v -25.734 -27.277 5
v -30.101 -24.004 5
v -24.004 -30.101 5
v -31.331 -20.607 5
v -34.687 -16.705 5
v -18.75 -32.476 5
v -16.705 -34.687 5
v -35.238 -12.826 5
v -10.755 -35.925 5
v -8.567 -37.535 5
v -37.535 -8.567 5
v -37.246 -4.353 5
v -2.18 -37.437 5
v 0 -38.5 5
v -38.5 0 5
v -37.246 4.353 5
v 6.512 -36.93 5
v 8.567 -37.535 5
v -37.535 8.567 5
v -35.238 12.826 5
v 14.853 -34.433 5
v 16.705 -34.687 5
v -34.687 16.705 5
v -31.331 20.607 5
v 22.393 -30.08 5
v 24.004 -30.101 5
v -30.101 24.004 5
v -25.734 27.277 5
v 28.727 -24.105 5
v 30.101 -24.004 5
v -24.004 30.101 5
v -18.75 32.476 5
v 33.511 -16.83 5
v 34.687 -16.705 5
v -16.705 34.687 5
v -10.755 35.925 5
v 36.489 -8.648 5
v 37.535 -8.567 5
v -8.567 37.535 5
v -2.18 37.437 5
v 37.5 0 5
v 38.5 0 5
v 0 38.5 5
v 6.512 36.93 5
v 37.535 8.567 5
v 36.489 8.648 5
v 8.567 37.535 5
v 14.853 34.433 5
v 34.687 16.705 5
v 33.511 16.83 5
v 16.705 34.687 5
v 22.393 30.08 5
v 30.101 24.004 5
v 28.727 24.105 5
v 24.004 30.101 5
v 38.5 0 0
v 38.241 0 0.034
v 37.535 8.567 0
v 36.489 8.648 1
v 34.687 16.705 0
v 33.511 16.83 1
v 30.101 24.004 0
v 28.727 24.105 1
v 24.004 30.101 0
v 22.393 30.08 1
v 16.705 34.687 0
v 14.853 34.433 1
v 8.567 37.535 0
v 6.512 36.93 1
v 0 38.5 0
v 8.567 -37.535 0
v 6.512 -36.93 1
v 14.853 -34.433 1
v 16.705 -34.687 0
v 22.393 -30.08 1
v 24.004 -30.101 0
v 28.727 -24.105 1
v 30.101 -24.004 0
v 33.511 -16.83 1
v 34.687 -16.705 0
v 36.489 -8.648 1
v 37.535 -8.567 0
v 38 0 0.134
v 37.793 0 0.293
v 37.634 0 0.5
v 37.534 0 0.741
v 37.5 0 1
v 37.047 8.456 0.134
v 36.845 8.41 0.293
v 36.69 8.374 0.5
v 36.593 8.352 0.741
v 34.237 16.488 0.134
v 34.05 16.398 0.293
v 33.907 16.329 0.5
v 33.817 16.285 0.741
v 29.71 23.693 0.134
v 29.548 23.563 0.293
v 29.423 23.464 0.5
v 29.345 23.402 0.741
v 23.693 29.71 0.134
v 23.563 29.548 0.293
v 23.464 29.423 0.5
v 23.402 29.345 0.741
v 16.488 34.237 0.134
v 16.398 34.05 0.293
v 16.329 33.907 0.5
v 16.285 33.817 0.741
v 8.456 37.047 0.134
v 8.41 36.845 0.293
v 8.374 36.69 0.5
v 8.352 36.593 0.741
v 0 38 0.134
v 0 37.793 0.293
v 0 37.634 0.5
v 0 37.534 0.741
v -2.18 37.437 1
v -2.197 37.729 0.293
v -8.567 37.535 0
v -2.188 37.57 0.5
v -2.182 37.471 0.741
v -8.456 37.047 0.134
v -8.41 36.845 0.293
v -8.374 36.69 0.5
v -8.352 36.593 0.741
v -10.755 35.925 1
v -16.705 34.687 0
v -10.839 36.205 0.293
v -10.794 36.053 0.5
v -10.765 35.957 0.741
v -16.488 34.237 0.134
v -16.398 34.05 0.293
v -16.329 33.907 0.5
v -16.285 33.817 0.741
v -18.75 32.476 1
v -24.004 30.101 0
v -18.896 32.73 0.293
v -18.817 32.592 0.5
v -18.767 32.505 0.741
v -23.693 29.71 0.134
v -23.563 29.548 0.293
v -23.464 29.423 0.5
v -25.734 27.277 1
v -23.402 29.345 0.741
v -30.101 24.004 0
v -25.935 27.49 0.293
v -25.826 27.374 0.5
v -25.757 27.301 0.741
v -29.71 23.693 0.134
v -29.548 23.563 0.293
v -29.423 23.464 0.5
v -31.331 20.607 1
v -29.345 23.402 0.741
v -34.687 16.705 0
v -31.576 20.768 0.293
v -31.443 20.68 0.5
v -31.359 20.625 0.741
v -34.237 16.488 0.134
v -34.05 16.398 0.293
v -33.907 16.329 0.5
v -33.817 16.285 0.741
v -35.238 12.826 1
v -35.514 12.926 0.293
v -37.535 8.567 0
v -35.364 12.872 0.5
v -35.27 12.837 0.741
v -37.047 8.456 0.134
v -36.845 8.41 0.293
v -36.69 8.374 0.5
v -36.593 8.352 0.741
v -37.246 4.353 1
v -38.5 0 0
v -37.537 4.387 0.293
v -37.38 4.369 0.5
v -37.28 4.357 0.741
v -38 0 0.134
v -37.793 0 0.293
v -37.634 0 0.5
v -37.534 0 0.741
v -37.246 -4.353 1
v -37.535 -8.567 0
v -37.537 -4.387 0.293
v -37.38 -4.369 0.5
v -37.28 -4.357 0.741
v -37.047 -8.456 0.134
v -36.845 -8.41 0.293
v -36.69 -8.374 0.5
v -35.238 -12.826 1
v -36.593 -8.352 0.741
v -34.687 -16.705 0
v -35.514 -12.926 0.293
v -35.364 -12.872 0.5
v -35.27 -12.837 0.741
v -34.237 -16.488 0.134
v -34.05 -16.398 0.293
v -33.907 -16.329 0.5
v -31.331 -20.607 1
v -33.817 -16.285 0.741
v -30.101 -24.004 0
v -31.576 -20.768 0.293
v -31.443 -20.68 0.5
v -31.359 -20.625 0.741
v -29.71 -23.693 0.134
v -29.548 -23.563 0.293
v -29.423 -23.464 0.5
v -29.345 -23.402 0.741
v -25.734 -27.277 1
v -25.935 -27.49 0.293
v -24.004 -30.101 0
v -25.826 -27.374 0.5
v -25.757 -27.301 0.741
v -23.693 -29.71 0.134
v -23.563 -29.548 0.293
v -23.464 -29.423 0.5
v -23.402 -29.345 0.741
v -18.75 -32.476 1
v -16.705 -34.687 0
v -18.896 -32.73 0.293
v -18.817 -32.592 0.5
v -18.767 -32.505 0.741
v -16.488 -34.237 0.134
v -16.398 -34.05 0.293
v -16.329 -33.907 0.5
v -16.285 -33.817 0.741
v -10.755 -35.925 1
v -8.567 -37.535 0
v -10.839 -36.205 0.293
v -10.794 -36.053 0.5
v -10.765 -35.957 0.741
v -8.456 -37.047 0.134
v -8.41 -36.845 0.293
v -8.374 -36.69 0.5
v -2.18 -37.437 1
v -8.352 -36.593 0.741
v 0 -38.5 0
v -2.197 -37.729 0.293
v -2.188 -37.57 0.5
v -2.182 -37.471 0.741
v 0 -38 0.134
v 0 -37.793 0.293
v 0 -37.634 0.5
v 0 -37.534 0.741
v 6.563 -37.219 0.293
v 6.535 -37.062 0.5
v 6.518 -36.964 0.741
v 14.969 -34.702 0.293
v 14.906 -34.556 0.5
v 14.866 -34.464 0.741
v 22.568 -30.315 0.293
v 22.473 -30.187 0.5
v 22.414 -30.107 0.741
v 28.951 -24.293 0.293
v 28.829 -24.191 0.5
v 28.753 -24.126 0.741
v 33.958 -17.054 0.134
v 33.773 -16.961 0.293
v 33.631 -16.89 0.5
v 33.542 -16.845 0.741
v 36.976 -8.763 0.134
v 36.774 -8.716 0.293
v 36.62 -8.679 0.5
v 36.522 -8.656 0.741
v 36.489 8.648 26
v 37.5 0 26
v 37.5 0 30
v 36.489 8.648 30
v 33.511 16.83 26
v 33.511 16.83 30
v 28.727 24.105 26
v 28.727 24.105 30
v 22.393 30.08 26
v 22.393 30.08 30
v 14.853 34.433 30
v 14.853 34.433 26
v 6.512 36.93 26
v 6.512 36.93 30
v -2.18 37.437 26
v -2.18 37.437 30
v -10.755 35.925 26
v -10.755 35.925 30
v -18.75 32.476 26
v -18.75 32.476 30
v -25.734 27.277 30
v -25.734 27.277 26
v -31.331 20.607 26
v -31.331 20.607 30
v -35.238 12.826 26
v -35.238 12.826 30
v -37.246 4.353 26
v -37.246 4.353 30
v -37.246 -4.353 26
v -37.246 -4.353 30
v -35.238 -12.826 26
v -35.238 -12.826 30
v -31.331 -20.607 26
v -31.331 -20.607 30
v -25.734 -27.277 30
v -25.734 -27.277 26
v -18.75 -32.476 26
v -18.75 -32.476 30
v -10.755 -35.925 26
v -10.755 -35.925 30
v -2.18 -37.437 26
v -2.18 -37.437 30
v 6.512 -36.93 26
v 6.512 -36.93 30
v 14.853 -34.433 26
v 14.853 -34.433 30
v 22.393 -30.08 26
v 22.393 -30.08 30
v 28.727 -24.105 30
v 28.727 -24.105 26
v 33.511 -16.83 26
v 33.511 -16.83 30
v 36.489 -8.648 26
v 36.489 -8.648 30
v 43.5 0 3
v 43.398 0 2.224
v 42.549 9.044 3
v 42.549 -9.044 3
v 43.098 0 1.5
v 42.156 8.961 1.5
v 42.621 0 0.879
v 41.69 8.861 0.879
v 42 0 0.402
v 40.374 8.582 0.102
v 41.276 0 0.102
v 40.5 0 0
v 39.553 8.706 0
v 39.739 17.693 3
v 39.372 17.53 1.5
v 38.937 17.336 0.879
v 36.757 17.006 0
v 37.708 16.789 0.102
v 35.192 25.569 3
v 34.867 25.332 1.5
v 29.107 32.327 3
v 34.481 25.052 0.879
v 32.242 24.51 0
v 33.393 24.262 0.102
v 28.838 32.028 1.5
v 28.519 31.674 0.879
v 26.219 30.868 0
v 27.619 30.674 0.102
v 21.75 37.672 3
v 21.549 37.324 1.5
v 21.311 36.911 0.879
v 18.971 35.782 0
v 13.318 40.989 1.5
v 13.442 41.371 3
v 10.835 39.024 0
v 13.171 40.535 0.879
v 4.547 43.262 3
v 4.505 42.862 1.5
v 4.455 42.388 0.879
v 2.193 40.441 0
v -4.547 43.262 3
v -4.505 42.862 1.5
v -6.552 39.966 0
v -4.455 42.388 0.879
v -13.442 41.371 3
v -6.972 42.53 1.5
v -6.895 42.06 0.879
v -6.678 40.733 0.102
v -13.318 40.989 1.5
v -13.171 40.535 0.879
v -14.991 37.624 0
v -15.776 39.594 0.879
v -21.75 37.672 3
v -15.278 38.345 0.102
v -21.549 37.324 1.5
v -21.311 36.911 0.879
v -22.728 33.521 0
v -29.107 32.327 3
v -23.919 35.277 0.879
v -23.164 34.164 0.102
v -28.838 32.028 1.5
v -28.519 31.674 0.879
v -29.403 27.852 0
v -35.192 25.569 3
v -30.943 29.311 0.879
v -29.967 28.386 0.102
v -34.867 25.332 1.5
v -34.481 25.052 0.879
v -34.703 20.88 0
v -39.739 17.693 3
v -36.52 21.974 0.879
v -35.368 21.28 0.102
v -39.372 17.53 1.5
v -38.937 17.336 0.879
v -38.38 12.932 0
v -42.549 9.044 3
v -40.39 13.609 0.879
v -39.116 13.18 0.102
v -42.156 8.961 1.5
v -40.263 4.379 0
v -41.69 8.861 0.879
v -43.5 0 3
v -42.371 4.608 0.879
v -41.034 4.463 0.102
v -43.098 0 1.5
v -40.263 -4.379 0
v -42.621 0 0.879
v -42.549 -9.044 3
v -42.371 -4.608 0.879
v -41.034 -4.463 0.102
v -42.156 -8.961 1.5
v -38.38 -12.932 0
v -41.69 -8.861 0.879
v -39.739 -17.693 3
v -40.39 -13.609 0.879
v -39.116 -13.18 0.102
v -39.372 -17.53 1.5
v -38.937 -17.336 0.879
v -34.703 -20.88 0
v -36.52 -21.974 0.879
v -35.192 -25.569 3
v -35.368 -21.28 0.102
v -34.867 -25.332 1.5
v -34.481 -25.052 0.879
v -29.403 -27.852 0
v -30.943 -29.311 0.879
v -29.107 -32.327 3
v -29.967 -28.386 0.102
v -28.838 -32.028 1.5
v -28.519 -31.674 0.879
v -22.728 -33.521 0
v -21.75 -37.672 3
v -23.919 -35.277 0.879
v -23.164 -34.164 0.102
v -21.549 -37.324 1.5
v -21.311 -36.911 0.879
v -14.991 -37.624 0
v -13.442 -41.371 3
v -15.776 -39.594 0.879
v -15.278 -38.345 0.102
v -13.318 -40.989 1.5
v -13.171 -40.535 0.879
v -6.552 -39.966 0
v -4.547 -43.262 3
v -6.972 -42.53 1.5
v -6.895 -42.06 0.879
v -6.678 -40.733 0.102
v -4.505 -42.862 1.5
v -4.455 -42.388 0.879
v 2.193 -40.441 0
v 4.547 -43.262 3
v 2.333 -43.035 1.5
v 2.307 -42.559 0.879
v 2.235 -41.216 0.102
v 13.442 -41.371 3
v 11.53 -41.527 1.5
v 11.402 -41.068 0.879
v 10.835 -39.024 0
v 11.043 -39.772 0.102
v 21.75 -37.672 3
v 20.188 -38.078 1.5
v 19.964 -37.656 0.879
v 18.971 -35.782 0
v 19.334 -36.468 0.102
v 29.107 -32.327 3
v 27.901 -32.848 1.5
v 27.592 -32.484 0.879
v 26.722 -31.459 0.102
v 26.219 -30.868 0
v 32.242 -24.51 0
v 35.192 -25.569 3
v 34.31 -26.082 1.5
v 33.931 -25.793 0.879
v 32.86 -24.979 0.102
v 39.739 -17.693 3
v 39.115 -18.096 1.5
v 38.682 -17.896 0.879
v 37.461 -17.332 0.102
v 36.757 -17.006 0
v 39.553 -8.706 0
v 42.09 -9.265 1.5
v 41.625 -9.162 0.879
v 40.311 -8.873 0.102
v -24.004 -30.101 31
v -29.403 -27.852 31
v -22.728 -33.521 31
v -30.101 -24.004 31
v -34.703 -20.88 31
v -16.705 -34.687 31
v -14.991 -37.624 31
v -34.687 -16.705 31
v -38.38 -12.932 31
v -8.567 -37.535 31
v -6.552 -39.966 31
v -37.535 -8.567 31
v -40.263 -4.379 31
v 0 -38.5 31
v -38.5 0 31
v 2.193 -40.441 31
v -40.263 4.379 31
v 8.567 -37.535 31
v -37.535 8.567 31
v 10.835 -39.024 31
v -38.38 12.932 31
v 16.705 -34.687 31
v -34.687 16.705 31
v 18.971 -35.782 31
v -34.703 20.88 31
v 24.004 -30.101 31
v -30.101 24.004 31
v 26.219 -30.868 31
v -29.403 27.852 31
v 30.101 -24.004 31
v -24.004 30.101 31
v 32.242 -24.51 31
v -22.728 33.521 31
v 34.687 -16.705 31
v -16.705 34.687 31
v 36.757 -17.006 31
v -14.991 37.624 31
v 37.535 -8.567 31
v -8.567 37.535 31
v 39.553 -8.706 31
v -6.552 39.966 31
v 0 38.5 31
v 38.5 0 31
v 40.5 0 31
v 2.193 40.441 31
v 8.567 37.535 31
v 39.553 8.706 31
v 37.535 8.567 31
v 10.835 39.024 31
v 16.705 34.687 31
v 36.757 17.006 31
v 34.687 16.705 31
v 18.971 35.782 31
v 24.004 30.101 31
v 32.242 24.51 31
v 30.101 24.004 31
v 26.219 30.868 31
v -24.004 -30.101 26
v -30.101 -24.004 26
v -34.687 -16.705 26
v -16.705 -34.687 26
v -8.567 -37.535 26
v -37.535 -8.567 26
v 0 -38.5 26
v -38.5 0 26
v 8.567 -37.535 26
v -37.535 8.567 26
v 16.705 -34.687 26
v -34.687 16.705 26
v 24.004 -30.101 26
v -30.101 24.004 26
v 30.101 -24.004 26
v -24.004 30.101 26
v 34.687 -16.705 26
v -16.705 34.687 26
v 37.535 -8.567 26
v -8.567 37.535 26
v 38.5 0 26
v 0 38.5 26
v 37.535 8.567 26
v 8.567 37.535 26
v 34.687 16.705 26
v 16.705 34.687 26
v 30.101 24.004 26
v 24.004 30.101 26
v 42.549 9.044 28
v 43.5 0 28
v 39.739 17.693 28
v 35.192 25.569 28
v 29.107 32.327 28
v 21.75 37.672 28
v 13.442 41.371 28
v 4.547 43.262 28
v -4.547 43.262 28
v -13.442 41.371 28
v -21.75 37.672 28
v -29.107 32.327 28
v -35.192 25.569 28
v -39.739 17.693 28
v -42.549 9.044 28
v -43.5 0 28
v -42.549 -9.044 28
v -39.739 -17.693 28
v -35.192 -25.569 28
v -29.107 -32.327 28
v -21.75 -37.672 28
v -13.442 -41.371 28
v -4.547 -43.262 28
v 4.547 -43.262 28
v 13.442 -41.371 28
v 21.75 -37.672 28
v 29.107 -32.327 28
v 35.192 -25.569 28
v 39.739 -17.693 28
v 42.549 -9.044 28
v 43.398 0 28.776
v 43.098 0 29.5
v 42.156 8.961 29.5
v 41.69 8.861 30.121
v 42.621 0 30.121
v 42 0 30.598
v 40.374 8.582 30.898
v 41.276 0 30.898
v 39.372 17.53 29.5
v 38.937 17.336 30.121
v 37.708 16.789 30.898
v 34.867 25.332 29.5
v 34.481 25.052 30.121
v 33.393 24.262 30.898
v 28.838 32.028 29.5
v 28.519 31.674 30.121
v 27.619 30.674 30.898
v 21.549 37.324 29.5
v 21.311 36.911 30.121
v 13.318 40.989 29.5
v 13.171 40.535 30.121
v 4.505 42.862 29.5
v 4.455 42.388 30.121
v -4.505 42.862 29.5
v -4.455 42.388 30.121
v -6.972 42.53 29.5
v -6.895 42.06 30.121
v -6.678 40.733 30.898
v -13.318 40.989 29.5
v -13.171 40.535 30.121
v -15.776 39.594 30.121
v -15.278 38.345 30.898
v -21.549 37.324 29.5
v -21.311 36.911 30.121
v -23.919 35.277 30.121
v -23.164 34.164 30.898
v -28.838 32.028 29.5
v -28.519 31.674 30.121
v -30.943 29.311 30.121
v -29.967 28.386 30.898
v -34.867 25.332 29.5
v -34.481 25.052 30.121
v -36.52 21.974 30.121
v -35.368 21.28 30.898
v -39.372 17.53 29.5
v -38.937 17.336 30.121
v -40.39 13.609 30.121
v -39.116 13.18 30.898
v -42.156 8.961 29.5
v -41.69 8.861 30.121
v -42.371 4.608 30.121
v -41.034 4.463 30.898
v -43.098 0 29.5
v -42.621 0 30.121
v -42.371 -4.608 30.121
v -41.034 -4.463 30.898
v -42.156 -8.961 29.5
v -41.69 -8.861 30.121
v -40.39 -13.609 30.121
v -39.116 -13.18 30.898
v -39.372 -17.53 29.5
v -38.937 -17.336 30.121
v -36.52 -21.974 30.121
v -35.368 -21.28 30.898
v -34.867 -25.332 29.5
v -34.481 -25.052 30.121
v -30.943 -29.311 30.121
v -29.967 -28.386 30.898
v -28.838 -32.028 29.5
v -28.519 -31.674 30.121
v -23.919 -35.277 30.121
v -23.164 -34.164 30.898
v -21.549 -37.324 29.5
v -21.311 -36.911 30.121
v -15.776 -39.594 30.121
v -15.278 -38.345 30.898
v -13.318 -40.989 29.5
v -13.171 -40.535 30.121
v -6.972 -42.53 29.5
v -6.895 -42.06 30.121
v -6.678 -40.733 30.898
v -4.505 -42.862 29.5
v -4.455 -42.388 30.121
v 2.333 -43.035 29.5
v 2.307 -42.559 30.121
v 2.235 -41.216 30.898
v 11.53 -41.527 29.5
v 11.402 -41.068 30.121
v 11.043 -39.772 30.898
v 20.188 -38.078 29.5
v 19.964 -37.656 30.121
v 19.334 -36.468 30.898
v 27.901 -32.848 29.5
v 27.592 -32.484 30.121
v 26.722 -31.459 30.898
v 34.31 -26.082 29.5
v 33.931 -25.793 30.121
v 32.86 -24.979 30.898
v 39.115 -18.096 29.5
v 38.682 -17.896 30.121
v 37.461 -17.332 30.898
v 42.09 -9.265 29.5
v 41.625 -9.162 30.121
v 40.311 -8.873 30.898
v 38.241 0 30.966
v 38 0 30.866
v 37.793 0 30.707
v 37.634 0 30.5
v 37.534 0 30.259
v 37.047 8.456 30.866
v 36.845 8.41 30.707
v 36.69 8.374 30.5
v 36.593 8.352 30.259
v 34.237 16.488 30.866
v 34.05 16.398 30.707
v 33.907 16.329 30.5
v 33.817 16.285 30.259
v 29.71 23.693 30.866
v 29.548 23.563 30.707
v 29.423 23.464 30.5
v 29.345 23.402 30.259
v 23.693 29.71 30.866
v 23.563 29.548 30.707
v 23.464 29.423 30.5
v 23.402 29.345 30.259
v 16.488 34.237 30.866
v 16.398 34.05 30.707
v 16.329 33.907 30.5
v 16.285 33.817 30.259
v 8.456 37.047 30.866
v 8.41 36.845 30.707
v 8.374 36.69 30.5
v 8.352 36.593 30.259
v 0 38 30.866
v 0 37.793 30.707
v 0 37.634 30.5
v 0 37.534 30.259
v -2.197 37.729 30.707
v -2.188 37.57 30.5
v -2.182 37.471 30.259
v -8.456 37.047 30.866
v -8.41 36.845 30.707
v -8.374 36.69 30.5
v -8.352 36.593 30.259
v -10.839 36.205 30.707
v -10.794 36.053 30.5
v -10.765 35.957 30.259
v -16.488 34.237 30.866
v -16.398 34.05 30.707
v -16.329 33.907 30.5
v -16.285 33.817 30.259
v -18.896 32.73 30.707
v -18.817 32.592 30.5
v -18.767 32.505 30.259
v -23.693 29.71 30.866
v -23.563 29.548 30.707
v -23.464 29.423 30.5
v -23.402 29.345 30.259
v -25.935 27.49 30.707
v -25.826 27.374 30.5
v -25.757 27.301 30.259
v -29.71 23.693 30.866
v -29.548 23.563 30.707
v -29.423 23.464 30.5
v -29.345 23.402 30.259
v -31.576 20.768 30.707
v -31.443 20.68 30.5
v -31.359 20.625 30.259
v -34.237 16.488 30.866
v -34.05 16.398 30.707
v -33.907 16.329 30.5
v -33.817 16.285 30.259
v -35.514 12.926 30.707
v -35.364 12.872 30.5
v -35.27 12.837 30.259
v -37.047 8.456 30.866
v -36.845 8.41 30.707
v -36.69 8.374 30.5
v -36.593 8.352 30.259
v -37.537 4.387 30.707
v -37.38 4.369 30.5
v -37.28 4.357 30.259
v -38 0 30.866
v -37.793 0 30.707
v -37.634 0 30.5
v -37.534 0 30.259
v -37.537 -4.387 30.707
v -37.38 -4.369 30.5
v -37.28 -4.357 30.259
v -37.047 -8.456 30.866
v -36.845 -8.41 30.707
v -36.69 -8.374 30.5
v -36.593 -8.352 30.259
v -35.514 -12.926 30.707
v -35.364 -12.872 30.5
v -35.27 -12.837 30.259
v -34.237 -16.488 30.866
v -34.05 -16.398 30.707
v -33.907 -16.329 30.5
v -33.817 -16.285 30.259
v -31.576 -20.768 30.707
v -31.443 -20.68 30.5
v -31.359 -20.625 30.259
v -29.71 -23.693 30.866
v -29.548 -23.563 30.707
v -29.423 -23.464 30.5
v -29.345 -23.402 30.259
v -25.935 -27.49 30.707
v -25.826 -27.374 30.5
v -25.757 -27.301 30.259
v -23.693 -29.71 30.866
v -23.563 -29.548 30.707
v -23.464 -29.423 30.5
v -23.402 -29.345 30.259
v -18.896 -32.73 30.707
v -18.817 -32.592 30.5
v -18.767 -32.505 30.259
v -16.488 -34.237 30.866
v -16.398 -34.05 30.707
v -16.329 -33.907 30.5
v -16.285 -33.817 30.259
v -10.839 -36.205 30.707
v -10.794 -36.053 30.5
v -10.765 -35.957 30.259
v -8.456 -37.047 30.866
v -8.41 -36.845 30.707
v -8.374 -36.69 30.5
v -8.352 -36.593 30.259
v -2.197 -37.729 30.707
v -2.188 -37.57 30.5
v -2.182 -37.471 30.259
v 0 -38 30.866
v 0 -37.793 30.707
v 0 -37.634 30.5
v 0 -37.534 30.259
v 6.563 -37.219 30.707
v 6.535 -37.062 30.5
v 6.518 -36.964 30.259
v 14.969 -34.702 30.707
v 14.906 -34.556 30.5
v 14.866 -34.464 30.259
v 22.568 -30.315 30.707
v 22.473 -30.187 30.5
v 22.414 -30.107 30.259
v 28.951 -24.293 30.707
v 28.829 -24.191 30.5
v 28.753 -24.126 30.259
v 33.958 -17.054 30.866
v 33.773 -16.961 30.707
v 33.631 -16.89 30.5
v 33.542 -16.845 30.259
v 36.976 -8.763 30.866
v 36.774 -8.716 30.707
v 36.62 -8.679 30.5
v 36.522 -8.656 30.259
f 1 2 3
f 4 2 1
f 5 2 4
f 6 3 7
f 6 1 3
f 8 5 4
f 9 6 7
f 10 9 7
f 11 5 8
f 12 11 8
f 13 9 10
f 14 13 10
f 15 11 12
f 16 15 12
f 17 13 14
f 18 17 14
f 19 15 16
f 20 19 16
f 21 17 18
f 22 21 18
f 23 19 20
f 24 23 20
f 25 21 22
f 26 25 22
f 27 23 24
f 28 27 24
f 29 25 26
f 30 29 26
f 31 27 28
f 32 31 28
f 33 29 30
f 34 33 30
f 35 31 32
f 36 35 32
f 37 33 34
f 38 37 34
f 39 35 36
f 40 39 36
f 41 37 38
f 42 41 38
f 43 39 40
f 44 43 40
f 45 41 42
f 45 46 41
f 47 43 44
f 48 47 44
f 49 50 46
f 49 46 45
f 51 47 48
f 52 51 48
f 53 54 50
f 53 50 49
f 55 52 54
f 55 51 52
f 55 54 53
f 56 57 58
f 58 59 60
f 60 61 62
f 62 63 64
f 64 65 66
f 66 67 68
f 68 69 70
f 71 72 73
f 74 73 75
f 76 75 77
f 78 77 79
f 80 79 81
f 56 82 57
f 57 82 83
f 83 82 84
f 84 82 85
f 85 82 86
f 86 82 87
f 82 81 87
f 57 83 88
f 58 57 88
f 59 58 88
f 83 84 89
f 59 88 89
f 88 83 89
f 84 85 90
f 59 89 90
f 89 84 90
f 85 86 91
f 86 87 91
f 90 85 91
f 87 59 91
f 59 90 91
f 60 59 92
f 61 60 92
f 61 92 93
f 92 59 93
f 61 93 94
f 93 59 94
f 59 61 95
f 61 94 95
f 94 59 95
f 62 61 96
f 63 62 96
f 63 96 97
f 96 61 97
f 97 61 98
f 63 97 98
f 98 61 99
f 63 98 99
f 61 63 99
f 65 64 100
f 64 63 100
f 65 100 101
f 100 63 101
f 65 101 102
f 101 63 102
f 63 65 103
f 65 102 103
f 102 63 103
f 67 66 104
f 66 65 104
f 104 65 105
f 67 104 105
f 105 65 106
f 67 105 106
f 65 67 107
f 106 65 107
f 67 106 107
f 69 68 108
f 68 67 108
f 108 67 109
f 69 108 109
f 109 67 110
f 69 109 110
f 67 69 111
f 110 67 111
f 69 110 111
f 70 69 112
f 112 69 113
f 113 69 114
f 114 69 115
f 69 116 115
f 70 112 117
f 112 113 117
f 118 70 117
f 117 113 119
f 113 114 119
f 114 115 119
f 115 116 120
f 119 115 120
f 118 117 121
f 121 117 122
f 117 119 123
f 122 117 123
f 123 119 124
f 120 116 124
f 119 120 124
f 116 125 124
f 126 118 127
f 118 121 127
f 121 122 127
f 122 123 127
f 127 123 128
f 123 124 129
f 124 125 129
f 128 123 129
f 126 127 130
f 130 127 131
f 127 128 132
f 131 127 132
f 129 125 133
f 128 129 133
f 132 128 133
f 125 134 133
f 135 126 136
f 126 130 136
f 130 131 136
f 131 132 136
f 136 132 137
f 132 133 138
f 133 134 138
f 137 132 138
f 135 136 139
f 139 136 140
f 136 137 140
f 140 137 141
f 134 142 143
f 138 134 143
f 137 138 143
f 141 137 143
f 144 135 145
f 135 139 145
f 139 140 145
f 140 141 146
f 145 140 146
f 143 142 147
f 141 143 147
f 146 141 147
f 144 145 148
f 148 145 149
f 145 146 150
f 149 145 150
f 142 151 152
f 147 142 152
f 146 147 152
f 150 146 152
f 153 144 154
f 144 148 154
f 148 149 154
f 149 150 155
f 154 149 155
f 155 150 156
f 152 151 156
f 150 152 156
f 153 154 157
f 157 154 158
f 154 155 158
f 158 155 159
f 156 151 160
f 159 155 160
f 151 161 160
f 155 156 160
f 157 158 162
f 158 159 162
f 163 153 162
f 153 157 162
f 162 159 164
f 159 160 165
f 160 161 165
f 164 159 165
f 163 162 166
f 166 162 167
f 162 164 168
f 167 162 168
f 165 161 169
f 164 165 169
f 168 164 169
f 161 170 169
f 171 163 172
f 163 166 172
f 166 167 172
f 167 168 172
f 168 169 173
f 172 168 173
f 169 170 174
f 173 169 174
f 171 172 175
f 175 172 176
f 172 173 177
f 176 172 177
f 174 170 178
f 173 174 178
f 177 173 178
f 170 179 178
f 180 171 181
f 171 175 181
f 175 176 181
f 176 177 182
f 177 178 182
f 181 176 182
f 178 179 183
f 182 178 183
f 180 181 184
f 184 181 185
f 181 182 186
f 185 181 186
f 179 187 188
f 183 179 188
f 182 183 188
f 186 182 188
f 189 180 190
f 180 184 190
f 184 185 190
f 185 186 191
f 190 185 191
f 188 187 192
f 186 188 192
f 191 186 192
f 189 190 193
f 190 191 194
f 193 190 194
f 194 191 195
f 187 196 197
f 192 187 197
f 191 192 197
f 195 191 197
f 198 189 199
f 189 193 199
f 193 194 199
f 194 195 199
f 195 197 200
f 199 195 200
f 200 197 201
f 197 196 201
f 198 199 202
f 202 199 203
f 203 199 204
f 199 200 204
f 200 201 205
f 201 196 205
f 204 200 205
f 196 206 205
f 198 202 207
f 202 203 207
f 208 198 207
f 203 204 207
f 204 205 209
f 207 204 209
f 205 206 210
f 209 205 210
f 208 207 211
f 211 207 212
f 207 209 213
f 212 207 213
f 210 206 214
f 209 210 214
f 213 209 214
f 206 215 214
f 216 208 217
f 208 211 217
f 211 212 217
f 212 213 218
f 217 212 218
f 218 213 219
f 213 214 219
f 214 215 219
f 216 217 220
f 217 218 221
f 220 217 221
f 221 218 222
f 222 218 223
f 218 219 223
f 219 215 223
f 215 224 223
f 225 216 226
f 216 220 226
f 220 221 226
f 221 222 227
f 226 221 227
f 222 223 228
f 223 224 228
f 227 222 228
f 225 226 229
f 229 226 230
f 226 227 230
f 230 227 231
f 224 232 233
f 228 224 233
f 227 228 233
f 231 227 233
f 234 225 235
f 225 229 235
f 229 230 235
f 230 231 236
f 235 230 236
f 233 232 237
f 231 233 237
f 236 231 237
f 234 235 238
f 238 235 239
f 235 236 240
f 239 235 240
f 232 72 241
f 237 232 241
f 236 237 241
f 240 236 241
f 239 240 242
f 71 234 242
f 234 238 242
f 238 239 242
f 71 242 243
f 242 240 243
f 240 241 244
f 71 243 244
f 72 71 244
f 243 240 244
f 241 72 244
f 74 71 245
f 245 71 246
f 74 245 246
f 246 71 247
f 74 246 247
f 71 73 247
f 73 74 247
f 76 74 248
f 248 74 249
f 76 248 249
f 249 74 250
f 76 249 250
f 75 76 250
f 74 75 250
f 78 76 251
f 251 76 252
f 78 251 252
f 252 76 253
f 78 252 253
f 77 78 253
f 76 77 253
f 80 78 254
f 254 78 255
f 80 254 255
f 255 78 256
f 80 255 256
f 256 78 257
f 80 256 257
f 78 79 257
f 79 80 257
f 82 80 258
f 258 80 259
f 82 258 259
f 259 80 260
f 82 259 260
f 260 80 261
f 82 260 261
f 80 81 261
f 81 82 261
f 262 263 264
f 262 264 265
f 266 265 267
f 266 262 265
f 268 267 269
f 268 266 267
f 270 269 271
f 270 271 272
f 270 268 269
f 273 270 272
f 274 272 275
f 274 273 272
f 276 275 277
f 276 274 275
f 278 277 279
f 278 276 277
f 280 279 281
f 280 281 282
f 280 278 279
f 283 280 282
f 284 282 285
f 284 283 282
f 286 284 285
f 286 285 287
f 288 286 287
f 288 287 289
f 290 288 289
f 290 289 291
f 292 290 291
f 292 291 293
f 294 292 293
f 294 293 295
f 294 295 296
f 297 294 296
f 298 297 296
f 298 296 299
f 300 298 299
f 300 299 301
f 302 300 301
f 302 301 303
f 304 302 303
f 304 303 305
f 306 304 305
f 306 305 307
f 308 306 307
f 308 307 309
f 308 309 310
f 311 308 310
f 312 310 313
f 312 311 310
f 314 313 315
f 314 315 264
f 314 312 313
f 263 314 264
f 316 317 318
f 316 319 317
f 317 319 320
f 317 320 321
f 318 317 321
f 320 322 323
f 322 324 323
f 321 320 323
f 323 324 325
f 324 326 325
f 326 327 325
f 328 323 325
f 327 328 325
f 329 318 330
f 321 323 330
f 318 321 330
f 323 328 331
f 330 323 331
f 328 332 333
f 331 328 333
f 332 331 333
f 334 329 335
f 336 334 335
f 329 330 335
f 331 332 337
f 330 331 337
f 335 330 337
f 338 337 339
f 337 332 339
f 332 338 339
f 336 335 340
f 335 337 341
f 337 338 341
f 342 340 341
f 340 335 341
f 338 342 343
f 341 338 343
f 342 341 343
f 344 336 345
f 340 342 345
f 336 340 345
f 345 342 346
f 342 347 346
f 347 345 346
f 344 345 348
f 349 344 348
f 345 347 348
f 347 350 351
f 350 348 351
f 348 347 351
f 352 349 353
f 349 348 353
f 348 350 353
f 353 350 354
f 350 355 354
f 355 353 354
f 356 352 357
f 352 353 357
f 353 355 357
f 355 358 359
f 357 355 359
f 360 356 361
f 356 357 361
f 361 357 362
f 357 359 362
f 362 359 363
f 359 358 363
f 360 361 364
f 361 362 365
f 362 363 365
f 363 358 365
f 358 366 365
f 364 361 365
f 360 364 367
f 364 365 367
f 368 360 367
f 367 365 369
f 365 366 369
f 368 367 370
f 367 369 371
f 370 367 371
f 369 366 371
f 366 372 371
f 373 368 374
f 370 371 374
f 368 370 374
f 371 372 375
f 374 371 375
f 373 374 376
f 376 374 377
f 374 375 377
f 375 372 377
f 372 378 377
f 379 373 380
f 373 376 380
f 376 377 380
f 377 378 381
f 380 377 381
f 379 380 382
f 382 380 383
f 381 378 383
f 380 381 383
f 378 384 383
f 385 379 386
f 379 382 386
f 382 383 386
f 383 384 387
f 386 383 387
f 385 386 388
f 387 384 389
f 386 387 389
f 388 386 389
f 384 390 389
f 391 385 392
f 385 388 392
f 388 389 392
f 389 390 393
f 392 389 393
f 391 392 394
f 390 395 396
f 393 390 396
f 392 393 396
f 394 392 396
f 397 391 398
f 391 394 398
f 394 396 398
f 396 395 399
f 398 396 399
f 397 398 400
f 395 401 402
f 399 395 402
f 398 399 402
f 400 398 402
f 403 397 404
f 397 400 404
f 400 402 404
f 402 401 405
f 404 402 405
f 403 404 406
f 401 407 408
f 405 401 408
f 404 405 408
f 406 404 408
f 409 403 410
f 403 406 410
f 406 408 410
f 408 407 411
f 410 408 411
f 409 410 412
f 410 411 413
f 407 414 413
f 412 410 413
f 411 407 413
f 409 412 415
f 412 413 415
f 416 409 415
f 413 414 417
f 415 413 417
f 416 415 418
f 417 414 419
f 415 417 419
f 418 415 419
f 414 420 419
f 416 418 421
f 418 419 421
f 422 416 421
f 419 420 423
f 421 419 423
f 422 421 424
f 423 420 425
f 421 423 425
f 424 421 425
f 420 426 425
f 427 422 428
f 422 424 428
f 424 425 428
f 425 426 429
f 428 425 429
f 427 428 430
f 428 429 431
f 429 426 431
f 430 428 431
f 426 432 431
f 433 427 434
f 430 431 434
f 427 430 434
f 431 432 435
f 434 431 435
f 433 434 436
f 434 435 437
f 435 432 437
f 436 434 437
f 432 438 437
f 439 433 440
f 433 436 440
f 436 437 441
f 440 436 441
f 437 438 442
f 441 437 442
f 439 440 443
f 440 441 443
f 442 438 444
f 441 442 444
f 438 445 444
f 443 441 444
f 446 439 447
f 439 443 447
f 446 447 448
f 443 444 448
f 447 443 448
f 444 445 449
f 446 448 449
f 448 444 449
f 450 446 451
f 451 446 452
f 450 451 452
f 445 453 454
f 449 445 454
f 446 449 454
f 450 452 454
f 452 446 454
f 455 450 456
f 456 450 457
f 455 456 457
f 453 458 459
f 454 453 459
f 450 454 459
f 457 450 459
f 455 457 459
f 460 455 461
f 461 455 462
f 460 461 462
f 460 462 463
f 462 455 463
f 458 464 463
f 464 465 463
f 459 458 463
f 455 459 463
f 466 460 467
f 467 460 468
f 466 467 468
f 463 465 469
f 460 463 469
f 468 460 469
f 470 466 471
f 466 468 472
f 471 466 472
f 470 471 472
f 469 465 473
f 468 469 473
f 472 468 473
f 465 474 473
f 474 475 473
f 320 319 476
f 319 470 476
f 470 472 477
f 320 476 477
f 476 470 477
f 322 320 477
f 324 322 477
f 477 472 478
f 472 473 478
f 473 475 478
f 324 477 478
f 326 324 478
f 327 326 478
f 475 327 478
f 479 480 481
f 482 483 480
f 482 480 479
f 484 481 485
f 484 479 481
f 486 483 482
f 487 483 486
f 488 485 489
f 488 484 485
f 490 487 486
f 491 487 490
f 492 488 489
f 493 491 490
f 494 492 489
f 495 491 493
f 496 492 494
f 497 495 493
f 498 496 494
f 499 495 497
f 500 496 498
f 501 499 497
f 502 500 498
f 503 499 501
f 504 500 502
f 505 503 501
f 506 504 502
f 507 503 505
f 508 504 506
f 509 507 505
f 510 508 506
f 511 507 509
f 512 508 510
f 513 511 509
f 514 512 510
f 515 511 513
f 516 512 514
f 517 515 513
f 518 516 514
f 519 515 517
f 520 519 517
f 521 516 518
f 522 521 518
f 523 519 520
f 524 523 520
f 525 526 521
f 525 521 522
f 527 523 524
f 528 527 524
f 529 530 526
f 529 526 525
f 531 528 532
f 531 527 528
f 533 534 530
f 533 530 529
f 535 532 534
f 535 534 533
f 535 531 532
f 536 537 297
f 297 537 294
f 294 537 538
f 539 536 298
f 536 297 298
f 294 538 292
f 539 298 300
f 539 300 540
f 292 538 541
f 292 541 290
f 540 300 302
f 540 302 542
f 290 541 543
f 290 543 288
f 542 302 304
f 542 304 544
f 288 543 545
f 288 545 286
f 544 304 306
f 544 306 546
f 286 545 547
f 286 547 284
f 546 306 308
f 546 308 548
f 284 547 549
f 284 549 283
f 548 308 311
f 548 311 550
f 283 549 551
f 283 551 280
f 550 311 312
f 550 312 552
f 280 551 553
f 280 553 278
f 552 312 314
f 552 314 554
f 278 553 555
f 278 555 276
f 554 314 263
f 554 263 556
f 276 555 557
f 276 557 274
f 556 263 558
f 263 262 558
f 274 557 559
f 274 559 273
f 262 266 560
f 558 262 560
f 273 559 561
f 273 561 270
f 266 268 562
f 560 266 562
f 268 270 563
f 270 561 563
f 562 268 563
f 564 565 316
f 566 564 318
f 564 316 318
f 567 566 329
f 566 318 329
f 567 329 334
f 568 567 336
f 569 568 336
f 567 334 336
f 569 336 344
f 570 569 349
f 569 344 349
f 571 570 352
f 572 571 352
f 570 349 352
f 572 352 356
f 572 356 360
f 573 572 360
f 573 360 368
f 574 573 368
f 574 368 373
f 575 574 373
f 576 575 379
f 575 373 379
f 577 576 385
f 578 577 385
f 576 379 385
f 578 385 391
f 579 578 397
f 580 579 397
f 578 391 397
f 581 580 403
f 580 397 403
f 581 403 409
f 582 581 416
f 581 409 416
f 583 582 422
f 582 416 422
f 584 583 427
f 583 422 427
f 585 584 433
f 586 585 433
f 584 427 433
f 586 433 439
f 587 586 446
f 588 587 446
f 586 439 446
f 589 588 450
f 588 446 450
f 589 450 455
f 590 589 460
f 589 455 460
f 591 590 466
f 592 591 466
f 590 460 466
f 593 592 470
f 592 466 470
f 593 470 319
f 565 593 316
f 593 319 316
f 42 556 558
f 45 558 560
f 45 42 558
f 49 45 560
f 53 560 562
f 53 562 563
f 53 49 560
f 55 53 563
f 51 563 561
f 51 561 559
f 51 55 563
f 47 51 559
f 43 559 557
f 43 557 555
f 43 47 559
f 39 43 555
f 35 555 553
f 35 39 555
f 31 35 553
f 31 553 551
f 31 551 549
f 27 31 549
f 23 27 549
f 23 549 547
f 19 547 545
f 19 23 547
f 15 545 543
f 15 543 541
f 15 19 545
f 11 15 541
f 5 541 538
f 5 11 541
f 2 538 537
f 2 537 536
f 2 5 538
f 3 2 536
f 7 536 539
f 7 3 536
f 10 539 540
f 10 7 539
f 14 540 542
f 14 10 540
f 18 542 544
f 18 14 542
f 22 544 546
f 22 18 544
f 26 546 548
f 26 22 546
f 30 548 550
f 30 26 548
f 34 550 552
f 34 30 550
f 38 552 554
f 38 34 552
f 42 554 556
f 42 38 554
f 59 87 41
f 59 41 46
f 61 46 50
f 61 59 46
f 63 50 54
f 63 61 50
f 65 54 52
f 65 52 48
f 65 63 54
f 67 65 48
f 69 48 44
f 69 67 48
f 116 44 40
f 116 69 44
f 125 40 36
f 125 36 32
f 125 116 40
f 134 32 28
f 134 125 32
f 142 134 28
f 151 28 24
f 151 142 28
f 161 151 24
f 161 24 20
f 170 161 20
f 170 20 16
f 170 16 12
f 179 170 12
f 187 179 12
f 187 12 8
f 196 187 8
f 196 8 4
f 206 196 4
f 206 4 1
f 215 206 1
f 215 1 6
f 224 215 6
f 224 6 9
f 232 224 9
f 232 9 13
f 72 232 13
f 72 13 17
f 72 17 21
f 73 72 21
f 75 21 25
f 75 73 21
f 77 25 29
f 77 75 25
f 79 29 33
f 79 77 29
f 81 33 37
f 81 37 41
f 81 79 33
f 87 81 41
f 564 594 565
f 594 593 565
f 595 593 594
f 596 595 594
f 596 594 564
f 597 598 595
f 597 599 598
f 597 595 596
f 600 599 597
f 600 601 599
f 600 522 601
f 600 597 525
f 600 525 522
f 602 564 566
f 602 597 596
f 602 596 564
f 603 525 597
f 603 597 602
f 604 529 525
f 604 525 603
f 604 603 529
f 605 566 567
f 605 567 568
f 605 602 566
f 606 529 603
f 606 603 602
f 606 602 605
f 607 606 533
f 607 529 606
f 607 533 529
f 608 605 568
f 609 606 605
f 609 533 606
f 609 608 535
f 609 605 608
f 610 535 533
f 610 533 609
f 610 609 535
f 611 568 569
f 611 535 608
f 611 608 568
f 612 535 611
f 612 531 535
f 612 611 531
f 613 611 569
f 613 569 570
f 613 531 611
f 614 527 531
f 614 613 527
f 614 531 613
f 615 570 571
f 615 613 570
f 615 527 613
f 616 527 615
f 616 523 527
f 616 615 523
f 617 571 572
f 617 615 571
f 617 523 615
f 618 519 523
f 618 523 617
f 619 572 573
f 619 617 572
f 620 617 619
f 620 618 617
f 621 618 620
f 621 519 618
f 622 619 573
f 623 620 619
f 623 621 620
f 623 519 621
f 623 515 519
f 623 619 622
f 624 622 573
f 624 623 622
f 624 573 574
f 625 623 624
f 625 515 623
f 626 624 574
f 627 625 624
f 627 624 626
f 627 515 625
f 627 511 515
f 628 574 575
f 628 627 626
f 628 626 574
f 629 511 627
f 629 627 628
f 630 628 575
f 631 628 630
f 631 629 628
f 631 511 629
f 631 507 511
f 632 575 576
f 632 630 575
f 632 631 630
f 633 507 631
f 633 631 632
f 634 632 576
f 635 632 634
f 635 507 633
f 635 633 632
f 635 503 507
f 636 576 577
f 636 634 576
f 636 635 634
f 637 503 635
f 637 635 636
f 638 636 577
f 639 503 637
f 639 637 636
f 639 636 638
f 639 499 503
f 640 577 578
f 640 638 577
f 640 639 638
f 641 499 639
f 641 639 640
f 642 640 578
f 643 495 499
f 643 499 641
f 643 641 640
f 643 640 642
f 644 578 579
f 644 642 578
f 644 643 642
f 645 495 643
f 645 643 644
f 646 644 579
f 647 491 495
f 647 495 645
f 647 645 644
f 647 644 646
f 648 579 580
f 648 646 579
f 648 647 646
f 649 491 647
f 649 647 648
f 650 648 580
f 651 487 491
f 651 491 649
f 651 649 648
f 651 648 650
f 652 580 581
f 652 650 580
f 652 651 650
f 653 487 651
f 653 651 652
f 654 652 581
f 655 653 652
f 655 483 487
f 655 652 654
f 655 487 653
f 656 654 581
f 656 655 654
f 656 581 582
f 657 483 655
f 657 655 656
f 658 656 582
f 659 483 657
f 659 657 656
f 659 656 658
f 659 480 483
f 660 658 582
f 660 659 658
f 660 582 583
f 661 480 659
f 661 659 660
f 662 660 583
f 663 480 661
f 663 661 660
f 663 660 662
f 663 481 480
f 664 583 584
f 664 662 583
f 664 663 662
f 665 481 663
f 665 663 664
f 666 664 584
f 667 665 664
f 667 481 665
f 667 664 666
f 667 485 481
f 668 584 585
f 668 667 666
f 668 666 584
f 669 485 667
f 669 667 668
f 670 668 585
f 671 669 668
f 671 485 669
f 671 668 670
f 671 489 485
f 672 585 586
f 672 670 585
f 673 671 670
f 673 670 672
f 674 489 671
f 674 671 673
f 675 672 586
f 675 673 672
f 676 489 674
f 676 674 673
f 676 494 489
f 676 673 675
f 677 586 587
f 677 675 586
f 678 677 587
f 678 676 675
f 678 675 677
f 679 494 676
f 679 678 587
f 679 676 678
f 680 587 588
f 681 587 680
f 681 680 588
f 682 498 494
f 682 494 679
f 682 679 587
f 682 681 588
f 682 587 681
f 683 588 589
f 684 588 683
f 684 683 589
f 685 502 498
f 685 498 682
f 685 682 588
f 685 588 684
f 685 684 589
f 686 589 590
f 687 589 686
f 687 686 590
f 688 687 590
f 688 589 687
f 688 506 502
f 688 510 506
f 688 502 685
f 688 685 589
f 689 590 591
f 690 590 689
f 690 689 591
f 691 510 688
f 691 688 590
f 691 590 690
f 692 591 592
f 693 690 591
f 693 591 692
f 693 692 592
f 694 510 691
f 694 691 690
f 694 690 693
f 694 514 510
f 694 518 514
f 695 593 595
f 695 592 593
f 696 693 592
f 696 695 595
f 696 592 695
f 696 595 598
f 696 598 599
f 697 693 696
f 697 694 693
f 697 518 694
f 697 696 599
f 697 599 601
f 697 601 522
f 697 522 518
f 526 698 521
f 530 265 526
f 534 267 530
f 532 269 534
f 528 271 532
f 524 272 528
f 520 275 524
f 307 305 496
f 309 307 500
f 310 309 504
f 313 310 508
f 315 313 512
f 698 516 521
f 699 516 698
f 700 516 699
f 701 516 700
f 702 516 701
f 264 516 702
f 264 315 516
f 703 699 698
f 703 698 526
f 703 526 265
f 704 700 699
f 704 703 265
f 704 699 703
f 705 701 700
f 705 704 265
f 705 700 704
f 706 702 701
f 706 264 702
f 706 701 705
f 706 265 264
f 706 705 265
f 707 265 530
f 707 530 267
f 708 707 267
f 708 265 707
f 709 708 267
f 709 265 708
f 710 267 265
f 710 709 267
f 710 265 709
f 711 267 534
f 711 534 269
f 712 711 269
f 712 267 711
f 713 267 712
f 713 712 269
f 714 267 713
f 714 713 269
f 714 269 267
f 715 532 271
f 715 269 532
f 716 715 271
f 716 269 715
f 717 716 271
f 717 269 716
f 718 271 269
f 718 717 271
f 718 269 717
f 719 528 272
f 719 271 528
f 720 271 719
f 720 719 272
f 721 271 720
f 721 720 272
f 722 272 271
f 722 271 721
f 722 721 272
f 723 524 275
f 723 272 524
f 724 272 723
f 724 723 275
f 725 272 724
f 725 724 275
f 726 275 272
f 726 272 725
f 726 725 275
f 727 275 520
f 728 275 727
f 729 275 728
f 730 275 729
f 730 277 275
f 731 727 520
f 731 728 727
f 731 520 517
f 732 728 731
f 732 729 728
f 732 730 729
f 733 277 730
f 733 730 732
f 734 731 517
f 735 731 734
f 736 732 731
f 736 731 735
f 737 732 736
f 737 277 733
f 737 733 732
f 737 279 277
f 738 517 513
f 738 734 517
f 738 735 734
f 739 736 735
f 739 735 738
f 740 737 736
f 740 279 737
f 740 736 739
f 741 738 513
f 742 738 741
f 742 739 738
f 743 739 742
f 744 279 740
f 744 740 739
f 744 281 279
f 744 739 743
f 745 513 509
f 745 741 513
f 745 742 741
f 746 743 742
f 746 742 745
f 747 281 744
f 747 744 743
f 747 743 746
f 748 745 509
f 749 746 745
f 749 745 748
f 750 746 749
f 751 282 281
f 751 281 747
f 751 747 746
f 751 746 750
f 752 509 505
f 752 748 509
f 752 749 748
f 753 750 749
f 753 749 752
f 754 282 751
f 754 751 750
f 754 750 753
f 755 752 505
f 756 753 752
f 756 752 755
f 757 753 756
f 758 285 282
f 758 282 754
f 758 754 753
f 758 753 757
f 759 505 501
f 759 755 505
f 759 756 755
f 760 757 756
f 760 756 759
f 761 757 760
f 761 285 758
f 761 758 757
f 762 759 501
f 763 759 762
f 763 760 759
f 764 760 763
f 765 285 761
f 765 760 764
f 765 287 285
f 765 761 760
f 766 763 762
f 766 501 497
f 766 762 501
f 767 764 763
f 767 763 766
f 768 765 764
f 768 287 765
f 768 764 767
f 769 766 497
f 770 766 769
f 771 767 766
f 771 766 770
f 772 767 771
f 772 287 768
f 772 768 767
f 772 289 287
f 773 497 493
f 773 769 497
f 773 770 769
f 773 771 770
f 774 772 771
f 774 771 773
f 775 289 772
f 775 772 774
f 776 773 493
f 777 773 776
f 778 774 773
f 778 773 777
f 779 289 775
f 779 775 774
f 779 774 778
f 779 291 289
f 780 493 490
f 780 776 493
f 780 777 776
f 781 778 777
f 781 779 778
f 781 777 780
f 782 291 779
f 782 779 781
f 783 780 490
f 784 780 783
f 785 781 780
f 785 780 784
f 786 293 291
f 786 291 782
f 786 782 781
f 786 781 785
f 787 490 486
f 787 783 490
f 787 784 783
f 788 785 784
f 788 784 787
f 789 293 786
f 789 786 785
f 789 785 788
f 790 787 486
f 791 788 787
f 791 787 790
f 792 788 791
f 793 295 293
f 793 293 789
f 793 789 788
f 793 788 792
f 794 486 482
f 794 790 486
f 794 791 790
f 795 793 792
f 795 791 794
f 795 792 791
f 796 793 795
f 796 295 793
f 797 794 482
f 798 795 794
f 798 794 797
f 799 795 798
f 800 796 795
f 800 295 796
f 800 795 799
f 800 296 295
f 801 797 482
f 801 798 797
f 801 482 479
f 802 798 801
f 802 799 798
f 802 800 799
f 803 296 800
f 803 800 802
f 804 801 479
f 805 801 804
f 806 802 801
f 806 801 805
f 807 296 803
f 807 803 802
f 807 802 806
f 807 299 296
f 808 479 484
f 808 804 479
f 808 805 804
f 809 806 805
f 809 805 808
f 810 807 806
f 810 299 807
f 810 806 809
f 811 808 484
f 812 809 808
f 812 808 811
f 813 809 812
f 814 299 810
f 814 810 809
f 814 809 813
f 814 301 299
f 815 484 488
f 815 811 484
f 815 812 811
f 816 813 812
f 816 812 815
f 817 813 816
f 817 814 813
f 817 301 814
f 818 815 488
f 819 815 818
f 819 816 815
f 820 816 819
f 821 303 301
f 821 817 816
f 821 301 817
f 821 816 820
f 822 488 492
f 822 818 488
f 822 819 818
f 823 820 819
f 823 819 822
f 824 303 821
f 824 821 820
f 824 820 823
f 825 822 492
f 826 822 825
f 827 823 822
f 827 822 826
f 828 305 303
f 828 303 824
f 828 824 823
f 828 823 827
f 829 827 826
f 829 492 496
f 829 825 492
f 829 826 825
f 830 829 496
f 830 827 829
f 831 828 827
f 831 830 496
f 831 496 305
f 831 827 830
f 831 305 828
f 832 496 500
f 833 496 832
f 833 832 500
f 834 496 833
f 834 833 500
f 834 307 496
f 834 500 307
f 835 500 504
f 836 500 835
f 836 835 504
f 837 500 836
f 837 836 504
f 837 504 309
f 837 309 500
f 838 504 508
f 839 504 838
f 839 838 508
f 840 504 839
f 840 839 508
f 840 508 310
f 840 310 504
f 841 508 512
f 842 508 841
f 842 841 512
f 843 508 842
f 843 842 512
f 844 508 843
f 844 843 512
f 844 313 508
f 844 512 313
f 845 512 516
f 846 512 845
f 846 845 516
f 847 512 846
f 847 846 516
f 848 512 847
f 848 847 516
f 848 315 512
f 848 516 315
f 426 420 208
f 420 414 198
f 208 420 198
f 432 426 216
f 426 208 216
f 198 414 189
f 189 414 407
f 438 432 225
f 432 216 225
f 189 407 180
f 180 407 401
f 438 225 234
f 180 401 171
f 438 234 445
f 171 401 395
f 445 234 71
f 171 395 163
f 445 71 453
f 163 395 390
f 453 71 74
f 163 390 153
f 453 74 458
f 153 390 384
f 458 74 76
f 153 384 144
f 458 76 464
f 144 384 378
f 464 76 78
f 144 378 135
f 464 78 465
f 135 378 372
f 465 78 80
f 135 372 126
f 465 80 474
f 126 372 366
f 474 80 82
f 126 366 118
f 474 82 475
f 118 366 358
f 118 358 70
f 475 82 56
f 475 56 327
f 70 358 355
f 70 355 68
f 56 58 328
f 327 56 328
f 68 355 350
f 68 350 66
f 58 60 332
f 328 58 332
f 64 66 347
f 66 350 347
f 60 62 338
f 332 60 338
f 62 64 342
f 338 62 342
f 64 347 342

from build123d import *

# Parameters (mm, degrees)
SKETCH1_R           = 43.5
SKETCH1_R_2         = 37.5
EXTRUDE_THIN3_DEPTH = 31
FILLET5_R           = 3
FILLET6_R           = 1
SHELL4_START        = 5
SHELL4_OUTLINE_R    = 38.5
SHELL4_OUTLINE_R_2  = 37.5
SHELL4_DEPTH        = 21


# Read off the part's stored shape, not the designer's step: Shell4
with BuildPart() as part:
    # Sketch1 → Extrude-Thin3 (new body)
    with BuildSketch(Plane.XY):
        Circle(SKETCH1_R)
        Circle(SKETCH1_R_2, mode=Mode.SUBTRACT)
    extrude(amount=EXTRUDE_THIN3_DEPTH)

    # Fillet5
    fillet5_edges = [part.edges().sort_by_distance(p)[0] for p in [
        (-43.5, 0, 0),
        (-43.5, 0, 31),
    ]]
    fillet(fillet5_edges, radius=FILLET5_R)

    # Fillet6
    fillet6_edges = [part.edges().sort_by_distance(p)[0] for p in [
        (-37.5, 0, 0),
        (-37.5, 0, 31),
    ]]
    fillet(fillet6_edges, radius=FILLET6_R)

    # Shell4 outline → Shell4 (cut)
    with BuildSketch(Plane.XY.offset(SHELL4_START)):
        Circle(SHELL4_OUTLINE_R)
        Circle(SHELL4_OUTLINE_R_2, mode=Mode.SUBTRACT)
    extrude(amount=SHELL4_DEPTH, mode=Mode.SUBTRACT)


solid = part.part
